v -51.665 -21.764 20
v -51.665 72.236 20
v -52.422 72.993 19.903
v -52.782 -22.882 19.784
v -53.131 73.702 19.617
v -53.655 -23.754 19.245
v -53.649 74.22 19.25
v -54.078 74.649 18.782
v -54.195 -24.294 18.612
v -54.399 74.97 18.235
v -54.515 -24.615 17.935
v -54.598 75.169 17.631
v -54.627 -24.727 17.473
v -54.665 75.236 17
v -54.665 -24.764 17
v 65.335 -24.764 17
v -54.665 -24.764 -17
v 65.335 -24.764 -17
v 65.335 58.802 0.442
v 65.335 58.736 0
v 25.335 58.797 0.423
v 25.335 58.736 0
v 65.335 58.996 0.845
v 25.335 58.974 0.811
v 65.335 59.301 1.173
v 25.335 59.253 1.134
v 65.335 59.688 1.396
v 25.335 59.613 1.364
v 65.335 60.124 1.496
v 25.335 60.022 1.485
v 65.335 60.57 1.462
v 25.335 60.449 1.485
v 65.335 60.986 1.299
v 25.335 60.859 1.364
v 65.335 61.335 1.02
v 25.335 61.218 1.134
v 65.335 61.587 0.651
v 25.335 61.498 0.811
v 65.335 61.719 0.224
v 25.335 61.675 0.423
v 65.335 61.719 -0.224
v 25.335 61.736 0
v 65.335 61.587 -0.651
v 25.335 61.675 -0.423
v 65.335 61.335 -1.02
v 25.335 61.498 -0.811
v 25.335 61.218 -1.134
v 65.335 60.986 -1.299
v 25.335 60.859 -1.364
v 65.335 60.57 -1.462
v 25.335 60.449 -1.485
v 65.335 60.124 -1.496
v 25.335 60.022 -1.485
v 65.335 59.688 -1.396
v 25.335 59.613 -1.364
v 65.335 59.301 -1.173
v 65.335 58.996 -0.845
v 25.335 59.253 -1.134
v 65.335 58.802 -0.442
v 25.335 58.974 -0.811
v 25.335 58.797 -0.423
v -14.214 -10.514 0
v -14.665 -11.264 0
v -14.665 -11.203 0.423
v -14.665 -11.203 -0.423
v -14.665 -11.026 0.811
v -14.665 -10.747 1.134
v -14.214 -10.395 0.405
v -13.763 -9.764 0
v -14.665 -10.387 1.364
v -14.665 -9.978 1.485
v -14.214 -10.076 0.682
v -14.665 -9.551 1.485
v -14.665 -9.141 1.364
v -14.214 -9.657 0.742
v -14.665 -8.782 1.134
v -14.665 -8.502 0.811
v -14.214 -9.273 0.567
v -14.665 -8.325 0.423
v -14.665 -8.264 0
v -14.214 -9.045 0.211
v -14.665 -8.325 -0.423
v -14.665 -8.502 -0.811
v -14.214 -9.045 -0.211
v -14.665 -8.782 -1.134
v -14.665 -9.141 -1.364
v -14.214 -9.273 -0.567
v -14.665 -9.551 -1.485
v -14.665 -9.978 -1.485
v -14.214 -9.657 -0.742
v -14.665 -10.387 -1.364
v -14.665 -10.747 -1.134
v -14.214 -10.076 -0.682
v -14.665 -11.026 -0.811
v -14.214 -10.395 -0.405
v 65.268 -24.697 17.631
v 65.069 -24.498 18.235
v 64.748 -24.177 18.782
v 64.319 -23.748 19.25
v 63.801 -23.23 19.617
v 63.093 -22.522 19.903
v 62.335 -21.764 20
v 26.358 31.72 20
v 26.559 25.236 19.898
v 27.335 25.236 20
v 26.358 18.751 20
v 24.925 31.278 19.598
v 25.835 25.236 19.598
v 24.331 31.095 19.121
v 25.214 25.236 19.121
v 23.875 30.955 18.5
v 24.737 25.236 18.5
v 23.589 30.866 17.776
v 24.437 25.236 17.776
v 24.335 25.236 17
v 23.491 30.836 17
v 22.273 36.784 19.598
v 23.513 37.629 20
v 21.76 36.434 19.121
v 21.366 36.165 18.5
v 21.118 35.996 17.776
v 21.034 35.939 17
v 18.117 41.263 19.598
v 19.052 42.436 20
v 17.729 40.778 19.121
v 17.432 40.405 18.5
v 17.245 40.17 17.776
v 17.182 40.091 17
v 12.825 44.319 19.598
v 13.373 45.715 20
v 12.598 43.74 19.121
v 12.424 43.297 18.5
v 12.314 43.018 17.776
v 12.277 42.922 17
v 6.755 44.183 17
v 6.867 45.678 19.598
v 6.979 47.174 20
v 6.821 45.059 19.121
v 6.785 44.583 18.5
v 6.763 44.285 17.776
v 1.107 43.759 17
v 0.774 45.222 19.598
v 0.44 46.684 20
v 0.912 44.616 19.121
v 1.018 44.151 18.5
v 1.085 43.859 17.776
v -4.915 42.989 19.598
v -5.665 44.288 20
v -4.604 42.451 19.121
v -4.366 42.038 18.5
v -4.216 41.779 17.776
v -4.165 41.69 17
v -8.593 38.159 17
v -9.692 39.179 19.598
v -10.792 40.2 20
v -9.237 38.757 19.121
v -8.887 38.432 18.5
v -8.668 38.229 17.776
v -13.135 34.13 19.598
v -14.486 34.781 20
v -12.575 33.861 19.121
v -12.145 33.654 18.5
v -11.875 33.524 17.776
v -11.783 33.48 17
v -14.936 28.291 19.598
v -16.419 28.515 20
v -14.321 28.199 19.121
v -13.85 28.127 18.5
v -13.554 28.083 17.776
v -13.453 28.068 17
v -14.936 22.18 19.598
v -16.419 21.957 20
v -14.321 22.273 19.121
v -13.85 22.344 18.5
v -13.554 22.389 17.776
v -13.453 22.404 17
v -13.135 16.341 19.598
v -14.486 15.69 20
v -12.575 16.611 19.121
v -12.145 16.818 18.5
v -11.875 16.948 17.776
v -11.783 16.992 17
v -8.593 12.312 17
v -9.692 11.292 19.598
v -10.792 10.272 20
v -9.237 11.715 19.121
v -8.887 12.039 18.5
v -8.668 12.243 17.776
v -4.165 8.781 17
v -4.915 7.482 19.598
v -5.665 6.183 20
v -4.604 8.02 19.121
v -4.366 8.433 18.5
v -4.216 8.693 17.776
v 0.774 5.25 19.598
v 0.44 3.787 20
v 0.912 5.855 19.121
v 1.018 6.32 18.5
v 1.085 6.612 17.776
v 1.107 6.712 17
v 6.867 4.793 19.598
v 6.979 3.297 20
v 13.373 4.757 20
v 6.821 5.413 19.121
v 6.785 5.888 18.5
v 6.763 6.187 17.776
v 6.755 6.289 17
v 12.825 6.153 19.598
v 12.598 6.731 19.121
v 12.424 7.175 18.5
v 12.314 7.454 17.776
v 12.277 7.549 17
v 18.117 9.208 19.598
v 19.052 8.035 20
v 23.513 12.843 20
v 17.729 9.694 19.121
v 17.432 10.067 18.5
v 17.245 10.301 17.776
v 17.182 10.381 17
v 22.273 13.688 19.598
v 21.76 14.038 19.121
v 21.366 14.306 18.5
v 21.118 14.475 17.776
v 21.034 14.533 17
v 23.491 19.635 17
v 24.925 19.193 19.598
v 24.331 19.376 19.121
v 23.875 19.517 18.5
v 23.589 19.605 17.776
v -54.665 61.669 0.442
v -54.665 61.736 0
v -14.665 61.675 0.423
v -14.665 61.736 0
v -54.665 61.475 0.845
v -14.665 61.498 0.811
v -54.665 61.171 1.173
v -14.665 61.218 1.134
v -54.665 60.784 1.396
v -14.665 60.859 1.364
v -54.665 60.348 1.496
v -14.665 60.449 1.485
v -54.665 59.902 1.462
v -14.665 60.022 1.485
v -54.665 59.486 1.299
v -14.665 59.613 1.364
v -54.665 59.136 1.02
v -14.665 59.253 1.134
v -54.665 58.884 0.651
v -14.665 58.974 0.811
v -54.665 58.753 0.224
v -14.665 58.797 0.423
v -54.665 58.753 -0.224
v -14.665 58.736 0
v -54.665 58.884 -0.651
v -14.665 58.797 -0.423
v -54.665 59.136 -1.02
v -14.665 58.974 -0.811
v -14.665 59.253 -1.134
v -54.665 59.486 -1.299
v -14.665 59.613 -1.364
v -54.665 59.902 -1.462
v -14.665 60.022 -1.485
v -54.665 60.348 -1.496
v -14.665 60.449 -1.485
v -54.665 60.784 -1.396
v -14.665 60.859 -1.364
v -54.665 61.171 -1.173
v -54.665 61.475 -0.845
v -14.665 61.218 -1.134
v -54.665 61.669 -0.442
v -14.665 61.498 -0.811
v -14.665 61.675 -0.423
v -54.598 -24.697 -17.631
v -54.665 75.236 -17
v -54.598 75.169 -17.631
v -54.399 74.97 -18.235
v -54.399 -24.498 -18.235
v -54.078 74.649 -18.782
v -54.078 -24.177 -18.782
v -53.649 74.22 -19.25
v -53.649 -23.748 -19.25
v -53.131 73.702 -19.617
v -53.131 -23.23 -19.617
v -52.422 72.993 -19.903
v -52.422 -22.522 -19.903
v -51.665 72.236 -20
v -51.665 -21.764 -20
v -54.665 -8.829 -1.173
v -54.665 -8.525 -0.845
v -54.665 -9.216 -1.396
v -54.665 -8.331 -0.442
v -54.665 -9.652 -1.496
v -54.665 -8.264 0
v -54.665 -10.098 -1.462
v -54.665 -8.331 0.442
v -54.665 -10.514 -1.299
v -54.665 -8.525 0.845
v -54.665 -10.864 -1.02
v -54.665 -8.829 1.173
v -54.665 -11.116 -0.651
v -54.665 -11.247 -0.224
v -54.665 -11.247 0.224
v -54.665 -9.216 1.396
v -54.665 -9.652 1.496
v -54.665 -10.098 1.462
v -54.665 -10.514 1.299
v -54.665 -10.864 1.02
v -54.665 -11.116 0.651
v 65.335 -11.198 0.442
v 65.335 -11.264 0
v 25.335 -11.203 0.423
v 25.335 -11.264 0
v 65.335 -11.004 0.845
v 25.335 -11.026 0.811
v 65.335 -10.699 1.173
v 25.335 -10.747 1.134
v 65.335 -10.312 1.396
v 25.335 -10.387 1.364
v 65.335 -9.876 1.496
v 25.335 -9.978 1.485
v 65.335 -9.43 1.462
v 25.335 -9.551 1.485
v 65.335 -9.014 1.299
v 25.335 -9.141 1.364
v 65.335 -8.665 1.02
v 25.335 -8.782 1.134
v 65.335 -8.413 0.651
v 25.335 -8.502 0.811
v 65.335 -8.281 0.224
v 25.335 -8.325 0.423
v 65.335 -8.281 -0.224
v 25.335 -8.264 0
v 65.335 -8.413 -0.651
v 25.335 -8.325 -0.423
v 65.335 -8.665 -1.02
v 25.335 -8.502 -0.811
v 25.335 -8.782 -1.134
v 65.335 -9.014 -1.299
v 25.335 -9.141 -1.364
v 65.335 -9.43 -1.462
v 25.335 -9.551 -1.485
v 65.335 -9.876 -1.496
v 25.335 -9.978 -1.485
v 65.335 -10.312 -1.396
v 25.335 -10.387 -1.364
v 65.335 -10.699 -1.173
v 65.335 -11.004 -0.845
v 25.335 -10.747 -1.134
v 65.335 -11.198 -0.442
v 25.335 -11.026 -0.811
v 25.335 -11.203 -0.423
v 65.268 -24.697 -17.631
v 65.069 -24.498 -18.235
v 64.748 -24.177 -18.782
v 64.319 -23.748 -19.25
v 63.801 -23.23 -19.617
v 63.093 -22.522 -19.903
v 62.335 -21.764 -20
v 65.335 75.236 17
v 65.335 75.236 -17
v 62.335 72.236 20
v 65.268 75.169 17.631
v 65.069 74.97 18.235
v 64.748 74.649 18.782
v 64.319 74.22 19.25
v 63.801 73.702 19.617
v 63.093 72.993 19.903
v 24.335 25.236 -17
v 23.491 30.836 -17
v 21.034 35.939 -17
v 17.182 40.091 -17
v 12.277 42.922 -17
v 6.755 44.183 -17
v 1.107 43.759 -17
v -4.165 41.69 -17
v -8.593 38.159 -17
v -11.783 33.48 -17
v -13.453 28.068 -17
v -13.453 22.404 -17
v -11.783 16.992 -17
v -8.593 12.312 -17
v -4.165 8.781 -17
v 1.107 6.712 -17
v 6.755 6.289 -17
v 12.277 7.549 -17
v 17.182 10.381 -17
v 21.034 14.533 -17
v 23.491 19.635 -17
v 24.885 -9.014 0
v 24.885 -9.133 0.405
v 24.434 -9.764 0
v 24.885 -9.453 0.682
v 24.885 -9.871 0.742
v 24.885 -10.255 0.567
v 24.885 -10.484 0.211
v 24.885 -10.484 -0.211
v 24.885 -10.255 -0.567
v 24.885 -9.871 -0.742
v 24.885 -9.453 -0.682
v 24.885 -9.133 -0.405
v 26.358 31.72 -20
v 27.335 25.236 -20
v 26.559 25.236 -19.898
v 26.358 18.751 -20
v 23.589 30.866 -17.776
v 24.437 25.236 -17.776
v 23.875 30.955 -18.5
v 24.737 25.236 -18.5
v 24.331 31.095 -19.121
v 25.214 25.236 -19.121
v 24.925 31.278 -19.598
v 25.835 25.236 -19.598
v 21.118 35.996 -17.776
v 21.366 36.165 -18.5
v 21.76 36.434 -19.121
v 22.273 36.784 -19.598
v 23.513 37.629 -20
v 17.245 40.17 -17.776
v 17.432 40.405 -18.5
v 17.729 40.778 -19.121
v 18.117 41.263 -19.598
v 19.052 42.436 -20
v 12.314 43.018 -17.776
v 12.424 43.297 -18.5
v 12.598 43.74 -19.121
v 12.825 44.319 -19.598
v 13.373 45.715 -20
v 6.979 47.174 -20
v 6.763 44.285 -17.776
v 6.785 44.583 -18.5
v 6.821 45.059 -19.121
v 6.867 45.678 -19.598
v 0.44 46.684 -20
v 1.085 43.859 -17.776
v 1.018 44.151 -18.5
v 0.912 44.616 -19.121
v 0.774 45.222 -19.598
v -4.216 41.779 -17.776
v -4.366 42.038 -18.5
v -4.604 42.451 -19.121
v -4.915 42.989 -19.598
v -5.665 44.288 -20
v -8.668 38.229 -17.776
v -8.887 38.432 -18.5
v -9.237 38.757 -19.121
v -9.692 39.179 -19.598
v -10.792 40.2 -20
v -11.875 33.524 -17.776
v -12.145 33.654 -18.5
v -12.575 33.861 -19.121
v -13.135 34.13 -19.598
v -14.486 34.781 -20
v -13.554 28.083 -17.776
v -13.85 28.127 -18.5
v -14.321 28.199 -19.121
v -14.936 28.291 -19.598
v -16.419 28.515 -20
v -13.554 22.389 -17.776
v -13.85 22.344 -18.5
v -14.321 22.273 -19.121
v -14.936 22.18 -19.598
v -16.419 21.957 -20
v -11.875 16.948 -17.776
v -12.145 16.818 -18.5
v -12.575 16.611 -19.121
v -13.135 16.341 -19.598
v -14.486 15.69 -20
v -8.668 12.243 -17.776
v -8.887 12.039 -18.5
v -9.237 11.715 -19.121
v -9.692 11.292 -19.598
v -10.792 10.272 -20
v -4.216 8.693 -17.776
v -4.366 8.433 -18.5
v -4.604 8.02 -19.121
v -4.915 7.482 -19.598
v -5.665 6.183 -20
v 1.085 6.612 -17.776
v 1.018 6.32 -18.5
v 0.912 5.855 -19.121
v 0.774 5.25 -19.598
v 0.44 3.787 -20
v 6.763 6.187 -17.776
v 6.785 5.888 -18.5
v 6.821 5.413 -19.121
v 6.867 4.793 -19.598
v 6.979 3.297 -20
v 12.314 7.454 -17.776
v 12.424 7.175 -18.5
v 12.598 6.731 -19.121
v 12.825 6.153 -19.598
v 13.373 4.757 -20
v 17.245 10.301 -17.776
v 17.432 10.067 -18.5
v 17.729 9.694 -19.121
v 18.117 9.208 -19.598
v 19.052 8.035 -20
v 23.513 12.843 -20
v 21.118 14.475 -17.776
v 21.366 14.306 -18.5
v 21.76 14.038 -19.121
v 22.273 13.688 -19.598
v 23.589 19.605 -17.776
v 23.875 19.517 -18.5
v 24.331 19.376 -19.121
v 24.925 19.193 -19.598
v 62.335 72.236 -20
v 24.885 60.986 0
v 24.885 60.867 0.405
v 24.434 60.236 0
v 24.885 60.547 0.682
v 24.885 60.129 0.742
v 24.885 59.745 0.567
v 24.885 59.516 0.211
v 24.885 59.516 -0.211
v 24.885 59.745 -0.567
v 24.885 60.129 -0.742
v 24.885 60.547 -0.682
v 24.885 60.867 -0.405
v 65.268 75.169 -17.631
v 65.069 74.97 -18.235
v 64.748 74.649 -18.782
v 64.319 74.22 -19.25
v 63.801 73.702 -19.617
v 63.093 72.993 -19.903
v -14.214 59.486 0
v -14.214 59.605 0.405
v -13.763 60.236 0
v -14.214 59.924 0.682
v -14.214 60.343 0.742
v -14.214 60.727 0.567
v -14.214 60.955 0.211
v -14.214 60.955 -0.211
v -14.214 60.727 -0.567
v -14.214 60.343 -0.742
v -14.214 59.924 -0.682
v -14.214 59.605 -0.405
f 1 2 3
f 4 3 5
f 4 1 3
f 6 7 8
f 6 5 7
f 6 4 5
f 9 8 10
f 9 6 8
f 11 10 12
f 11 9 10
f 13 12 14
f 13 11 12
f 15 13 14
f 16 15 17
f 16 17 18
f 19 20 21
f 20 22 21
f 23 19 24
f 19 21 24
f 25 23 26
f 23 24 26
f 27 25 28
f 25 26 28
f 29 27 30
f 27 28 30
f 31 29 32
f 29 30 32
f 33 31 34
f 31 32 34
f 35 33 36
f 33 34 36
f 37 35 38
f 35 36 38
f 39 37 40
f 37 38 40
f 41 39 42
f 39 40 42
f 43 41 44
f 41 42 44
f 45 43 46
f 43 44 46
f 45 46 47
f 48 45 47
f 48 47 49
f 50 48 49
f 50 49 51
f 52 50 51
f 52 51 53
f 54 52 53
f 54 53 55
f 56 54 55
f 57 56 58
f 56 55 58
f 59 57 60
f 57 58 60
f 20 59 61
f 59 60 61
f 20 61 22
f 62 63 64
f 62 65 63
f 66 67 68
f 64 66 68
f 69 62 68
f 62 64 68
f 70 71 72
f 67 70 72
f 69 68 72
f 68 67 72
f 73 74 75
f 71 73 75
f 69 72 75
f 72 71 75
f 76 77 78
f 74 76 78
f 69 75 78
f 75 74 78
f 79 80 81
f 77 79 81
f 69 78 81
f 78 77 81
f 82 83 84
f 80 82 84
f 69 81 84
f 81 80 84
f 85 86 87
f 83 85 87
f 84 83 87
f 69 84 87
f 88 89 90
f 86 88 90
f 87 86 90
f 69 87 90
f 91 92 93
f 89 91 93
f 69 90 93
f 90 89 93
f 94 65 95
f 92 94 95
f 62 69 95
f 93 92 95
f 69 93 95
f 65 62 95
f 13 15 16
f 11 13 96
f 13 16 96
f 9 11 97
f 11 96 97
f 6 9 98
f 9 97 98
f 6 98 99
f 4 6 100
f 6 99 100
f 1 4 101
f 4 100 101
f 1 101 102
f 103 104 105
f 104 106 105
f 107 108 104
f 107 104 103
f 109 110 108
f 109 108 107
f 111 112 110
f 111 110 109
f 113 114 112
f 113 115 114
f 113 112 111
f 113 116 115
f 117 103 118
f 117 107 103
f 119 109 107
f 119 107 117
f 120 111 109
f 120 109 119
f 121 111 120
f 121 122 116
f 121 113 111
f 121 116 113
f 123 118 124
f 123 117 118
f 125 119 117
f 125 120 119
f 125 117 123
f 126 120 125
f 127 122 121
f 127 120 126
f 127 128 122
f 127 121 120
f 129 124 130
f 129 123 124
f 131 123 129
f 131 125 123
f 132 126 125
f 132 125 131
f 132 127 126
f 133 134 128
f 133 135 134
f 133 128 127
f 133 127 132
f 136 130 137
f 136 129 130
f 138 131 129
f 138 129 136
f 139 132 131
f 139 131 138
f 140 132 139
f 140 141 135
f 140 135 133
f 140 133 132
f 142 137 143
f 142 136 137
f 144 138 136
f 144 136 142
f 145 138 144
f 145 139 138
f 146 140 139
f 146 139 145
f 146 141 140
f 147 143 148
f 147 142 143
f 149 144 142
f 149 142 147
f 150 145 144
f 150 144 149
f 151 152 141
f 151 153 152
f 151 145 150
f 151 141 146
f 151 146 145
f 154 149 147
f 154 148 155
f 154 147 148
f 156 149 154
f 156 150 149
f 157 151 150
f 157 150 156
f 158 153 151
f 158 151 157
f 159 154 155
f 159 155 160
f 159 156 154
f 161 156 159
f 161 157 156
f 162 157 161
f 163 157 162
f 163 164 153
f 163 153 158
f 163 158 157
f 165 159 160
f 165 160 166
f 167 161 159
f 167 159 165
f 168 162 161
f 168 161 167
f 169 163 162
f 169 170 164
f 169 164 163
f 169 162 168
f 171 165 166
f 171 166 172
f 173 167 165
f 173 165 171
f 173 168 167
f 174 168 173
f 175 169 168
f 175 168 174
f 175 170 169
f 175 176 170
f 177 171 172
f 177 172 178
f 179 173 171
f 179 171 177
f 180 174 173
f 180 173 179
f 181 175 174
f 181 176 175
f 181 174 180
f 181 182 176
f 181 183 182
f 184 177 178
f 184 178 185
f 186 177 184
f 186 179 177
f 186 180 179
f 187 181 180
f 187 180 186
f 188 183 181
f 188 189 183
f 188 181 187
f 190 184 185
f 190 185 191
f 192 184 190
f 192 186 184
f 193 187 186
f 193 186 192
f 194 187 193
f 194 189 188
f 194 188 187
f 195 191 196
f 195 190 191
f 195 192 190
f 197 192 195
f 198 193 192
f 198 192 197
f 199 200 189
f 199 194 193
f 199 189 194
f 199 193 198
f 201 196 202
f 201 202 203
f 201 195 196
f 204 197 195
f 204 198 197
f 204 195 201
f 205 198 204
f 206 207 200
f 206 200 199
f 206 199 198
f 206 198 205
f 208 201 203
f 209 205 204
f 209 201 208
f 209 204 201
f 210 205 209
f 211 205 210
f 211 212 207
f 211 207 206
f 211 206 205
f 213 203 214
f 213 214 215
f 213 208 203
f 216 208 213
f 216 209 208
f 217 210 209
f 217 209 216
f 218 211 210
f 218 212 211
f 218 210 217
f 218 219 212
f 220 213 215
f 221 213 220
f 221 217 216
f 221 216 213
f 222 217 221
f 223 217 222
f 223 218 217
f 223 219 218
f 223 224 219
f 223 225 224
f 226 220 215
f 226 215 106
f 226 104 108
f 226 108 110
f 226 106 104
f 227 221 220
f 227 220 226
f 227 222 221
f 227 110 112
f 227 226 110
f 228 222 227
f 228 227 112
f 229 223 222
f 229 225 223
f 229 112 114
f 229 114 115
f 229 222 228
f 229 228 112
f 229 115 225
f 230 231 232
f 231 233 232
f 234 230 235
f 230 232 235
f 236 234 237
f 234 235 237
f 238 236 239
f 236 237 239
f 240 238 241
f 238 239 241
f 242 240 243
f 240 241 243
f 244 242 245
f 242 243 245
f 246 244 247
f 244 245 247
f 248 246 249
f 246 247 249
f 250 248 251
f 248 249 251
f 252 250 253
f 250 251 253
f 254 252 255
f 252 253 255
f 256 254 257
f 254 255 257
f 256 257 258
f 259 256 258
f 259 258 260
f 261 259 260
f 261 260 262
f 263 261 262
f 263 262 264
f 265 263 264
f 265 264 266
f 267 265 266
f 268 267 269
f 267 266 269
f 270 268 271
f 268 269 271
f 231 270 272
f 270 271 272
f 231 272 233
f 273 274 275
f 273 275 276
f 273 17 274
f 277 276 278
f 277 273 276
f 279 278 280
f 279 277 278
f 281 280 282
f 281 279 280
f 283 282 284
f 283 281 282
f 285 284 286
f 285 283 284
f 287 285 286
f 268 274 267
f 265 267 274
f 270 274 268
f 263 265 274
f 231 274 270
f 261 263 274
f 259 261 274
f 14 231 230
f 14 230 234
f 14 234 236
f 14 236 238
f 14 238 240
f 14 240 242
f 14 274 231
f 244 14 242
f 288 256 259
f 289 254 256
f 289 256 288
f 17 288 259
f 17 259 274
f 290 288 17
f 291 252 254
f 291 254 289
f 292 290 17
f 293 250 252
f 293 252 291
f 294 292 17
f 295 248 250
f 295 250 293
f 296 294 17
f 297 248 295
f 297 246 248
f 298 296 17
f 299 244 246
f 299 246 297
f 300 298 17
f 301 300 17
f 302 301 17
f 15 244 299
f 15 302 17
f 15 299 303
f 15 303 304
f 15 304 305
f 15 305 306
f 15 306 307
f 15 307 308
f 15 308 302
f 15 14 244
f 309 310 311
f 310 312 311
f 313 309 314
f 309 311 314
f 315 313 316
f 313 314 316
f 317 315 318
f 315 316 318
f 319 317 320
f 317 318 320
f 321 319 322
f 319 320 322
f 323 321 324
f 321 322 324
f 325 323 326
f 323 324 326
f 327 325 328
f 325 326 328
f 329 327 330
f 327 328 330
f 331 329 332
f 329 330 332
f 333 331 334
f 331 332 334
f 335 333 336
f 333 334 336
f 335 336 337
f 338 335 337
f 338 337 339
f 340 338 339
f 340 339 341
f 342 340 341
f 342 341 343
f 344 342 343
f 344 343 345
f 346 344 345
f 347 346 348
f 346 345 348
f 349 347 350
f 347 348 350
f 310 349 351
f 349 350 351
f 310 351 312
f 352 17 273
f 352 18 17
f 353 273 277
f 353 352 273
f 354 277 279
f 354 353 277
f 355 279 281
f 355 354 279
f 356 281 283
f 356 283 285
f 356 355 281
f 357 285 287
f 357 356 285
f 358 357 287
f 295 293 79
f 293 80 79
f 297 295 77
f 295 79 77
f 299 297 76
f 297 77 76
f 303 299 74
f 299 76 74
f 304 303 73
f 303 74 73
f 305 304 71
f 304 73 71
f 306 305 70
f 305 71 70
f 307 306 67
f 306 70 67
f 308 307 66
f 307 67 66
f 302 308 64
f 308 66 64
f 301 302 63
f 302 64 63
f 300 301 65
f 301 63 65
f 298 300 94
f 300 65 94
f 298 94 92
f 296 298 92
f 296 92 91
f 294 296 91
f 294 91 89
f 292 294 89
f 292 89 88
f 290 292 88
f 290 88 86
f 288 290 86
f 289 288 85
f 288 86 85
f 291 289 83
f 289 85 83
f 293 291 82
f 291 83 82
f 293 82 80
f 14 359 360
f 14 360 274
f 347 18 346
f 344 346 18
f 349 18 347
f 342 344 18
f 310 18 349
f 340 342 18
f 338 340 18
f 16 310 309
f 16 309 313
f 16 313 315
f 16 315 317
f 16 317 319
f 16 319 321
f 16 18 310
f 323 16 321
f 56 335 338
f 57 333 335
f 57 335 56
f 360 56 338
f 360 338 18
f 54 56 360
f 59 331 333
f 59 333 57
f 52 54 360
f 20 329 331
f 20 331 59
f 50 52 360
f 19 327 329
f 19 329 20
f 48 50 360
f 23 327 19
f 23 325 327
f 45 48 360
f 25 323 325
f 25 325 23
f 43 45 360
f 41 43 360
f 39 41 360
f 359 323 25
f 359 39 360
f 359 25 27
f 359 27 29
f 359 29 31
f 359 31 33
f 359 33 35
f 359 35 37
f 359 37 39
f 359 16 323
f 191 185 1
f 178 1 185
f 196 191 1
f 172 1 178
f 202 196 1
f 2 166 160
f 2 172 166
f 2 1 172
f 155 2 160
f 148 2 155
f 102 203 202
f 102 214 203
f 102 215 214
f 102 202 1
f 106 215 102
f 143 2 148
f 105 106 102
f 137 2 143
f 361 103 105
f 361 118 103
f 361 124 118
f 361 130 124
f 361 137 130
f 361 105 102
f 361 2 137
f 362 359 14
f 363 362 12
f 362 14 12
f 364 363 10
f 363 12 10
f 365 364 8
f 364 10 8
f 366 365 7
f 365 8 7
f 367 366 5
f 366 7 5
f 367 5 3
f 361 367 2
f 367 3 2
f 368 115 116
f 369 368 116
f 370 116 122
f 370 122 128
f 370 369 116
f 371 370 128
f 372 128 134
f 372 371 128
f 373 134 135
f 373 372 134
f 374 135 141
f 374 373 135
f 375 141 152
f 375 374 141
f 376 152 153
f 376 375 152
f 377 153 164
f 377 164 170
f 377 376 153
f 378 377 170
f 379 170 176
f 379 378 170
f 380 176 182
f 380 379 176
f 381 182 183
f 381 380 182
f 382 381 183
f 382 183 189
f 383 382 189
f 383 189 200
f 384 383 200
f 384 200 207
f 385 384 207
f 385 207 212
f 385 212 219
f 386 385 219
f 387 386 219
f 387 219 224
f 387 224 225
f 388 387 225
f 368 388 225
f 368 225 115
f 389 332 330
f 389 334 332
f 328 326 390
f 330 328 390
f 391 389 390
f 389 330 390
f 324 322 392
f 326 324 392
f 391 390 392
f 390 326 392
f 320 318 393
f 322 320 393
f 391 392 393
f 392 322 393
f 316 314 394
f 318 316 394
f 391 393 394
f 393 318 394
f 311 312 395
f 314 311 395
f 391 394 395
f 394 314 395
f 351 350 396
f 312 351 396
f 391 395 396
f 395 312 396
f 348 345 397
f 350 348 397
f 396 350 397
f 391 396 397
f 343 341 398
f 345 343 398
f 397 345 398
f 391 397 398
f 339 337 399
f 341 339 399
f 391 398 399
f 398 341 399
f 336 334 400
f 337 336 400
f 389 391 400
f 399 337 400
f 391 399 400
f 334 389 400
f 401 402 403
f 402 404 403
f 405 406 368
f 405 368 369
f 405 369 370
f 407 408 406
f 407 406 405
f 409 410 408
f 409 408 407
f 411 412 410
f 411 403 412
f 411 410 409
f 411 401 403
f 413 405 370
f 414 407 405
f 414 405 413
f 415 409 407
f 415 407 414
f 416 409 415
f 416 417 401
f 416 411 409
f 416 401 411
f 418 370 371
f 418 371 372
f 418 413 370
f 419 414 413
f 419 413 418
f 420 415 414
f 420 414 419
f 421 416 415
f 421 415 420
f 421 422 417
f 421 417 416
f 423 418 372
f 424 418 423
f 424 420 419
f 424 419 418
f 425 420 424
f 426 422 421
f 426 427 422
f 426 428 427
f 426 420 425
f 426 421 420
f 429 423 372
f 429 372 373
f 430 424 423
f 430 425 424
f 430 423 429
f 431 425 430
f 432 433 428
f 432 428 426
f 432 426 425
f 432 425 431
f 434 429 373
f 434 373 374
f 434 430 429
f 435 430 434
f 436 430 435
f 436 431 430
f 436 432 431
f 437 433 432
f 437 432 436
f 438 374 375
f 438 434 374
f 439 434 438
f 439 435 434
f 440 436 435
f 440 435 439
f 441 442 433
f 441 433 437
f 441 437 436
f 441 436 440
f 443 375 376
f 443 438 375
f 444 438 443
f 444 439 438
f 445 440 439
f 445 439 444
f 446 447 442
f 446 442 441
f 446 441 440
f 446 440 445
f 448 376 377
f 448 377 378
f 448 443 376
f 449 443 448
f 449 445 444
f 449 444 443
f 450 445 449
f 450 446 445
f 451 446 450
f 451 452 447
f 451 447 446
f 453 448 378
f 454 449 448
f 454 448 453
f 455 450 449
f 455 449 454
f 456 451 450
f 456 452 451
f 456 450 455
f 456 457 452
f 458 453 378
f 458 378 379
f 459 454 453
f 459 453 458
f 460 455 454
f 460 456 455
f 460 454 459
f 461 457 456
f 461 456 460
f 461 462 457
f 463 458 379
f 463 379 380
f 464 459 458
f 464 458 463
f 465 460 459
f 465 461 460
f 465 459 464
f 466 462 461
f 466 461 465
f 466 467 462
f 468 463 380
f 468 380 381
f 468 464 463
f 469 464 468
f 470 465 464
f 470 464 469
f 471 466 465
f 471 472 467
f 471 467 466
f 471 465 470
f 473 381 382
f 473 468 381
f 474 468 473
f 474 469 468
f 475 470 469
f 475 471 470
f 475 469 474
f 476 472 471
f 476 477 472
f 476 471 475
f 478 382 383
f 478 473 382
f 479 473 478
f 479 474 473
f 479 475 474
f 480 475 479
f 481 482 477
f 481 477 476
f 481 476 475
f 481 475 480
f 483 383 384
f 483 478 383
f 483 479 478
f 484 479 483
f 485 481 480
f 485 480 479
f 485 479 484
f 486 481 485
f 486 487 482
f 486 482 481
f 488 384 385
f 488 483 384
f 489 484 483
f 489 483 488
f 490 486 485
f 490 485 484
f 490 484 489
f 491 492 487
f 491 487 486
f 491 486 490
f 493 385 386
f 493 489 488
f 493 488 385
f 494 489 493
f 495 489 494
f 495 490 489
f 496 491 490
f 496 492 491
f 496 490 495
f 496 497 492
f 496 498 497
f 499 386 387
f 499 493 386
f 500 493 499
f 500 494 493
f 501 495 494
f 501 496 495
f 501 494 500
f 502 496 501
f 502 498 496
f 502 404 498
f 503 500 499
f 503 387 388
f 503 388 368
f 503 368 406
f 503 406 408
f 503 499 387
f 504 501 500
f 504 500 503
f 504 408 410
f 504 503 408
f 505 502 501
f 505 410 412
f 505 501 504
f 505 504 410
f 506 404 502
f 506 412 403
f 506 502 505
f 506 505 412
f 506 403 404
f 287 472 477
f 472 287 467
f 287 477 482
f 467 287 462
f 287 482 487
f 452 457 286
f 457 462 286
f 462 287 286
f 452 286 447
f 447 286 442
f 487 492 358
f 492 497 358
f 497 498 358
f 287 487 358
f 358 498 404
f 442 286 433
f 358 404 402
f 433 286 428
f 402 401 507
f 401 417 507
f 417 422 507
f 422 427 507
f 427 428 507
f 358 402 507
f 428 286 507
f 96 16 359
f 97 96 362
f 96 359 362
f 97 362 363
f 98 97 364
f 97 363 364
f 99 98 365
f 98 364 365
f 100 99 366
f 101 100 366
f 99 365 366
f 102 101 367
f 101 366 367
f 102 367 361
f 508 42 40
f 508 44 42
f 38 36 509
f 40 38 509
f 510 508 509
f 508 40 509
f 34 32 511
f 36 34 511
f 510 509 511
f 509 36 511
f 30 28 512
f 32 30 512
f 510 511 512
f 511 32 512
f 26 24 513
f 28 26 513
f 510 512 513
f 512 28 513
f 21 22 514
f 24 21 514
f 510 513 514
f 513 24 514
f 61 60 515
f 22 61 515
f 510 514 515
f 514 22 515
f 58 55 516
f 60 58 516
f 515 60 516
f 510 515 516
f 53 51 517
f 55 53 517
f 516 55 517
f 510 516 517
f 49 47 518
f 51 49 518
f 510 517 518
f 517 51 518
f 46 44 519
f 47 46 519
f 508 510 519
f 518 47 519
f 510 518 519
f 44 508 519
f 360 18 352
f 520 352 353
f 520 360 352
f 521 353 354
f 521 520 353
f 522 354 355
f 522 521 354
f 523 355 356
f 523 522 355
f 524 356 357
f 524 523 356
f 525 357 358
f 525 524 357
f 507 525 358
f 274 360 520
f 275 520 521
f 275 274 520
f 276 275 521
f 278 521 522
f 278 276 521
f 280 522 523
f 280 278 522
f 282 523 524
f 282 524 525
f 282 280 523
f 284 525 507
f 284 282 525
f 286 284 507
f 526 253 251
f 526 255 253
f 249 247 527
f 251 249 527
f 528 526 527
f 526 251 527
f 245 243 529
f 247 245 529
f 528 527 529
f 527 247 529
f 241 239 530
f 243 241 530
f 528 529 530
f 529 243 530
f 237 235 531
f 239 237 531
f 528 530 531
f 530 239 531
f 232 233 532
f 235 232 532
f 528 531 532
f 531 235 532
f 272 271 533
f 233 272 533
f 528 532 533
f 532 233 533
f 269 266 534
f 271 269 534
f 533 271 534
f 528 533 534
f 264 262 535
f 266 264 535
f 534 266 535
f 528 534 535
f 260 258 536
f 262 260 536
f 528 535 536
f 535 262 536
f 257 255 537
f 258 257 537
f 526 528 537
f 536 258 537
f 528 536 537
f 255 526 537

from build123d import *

# Parameters (mm, degrees)
F0_R     = 19
F1_DEPTH = 20
F2_R     = 3
F4_D     = 3
F4_DEPTH = 40
F4_TIP   = 0.9012909285
F6_D     = 3
F6_DEPTH = 40
F6_TIP   = 0.9012909285


with BuildPart() as f1:
    # F0 (on Top) → F1 (new body, symmetric)
    with BuildSketch(Plane.XY):
        Polygon((65.3352615237, 75.2357769758), (-54.6647384763, 75.2357769758), (-54.6647384763, 60.2357769758), (-54.6647384763, -9.7642230242), (-54.6647384763, -24.7642230242), (65.3352615237, -24.7642230242), align=None)
        with Locations((5.3352615237, 25.2357769758)):
            Circle(F0_R, mode=Mode.SUBTRACT)
    extrude(amount=F1_DEPTH, both=True)

    # F2
    f2_edges = [f1.edges().sort_by_distance(p)[0] for p in [
        (5.335262, 75.235777, 20),
        (-54.664738, 25.235777, 20),
        (5.335262, -24.764223, 20),
        (65.335262, 25.235777, 20),
        (-13.664738, 25.235777, 20),
        (65.335262, 25.235777, -20),
        (5.335262, 75.235777, -20),
        (-54.664738, 25.235777, -20),
        (5.335262, -24.764223, -20),
        (-13.664738, 25.235777, -20),
    ]]
    fillet(f2_edges, radius=F2_R)

    # F4
    with Locations(Plane(origin=(-54.6647384763, 0, 0), x_dir=(0, -1, 0), z_dir=(-1, 0, 0))):
        with Locations((9.7642230242, 0), (-60.2357769758, 0)):
            Hole(F4_D / 2, depth=F4_DEPTH)
            with Locations((0, 0, -(F4_DEPTH + F4_TIP / 2))):  # 118° drill point
                Cone(0, F4_D / 2, F4_TIP, mode=Mode.SUBTRACT)

    # F6
    with Locations(Plane.YZ.offset(65.3352615237)):
        with Locations((60.2357769758, 0), (-9.7642230242, 0)):
            Hole(F6_D / 2, depth=F6_DEPTH)
            with Locations((0, 0, -(F6_DEPTH + F6_TIP / 2))):  # 118° drill point
                Cone(0, F6_D / 2, F6_TIP, mode=Mode.SUBTRACT)


solid = f1.part
